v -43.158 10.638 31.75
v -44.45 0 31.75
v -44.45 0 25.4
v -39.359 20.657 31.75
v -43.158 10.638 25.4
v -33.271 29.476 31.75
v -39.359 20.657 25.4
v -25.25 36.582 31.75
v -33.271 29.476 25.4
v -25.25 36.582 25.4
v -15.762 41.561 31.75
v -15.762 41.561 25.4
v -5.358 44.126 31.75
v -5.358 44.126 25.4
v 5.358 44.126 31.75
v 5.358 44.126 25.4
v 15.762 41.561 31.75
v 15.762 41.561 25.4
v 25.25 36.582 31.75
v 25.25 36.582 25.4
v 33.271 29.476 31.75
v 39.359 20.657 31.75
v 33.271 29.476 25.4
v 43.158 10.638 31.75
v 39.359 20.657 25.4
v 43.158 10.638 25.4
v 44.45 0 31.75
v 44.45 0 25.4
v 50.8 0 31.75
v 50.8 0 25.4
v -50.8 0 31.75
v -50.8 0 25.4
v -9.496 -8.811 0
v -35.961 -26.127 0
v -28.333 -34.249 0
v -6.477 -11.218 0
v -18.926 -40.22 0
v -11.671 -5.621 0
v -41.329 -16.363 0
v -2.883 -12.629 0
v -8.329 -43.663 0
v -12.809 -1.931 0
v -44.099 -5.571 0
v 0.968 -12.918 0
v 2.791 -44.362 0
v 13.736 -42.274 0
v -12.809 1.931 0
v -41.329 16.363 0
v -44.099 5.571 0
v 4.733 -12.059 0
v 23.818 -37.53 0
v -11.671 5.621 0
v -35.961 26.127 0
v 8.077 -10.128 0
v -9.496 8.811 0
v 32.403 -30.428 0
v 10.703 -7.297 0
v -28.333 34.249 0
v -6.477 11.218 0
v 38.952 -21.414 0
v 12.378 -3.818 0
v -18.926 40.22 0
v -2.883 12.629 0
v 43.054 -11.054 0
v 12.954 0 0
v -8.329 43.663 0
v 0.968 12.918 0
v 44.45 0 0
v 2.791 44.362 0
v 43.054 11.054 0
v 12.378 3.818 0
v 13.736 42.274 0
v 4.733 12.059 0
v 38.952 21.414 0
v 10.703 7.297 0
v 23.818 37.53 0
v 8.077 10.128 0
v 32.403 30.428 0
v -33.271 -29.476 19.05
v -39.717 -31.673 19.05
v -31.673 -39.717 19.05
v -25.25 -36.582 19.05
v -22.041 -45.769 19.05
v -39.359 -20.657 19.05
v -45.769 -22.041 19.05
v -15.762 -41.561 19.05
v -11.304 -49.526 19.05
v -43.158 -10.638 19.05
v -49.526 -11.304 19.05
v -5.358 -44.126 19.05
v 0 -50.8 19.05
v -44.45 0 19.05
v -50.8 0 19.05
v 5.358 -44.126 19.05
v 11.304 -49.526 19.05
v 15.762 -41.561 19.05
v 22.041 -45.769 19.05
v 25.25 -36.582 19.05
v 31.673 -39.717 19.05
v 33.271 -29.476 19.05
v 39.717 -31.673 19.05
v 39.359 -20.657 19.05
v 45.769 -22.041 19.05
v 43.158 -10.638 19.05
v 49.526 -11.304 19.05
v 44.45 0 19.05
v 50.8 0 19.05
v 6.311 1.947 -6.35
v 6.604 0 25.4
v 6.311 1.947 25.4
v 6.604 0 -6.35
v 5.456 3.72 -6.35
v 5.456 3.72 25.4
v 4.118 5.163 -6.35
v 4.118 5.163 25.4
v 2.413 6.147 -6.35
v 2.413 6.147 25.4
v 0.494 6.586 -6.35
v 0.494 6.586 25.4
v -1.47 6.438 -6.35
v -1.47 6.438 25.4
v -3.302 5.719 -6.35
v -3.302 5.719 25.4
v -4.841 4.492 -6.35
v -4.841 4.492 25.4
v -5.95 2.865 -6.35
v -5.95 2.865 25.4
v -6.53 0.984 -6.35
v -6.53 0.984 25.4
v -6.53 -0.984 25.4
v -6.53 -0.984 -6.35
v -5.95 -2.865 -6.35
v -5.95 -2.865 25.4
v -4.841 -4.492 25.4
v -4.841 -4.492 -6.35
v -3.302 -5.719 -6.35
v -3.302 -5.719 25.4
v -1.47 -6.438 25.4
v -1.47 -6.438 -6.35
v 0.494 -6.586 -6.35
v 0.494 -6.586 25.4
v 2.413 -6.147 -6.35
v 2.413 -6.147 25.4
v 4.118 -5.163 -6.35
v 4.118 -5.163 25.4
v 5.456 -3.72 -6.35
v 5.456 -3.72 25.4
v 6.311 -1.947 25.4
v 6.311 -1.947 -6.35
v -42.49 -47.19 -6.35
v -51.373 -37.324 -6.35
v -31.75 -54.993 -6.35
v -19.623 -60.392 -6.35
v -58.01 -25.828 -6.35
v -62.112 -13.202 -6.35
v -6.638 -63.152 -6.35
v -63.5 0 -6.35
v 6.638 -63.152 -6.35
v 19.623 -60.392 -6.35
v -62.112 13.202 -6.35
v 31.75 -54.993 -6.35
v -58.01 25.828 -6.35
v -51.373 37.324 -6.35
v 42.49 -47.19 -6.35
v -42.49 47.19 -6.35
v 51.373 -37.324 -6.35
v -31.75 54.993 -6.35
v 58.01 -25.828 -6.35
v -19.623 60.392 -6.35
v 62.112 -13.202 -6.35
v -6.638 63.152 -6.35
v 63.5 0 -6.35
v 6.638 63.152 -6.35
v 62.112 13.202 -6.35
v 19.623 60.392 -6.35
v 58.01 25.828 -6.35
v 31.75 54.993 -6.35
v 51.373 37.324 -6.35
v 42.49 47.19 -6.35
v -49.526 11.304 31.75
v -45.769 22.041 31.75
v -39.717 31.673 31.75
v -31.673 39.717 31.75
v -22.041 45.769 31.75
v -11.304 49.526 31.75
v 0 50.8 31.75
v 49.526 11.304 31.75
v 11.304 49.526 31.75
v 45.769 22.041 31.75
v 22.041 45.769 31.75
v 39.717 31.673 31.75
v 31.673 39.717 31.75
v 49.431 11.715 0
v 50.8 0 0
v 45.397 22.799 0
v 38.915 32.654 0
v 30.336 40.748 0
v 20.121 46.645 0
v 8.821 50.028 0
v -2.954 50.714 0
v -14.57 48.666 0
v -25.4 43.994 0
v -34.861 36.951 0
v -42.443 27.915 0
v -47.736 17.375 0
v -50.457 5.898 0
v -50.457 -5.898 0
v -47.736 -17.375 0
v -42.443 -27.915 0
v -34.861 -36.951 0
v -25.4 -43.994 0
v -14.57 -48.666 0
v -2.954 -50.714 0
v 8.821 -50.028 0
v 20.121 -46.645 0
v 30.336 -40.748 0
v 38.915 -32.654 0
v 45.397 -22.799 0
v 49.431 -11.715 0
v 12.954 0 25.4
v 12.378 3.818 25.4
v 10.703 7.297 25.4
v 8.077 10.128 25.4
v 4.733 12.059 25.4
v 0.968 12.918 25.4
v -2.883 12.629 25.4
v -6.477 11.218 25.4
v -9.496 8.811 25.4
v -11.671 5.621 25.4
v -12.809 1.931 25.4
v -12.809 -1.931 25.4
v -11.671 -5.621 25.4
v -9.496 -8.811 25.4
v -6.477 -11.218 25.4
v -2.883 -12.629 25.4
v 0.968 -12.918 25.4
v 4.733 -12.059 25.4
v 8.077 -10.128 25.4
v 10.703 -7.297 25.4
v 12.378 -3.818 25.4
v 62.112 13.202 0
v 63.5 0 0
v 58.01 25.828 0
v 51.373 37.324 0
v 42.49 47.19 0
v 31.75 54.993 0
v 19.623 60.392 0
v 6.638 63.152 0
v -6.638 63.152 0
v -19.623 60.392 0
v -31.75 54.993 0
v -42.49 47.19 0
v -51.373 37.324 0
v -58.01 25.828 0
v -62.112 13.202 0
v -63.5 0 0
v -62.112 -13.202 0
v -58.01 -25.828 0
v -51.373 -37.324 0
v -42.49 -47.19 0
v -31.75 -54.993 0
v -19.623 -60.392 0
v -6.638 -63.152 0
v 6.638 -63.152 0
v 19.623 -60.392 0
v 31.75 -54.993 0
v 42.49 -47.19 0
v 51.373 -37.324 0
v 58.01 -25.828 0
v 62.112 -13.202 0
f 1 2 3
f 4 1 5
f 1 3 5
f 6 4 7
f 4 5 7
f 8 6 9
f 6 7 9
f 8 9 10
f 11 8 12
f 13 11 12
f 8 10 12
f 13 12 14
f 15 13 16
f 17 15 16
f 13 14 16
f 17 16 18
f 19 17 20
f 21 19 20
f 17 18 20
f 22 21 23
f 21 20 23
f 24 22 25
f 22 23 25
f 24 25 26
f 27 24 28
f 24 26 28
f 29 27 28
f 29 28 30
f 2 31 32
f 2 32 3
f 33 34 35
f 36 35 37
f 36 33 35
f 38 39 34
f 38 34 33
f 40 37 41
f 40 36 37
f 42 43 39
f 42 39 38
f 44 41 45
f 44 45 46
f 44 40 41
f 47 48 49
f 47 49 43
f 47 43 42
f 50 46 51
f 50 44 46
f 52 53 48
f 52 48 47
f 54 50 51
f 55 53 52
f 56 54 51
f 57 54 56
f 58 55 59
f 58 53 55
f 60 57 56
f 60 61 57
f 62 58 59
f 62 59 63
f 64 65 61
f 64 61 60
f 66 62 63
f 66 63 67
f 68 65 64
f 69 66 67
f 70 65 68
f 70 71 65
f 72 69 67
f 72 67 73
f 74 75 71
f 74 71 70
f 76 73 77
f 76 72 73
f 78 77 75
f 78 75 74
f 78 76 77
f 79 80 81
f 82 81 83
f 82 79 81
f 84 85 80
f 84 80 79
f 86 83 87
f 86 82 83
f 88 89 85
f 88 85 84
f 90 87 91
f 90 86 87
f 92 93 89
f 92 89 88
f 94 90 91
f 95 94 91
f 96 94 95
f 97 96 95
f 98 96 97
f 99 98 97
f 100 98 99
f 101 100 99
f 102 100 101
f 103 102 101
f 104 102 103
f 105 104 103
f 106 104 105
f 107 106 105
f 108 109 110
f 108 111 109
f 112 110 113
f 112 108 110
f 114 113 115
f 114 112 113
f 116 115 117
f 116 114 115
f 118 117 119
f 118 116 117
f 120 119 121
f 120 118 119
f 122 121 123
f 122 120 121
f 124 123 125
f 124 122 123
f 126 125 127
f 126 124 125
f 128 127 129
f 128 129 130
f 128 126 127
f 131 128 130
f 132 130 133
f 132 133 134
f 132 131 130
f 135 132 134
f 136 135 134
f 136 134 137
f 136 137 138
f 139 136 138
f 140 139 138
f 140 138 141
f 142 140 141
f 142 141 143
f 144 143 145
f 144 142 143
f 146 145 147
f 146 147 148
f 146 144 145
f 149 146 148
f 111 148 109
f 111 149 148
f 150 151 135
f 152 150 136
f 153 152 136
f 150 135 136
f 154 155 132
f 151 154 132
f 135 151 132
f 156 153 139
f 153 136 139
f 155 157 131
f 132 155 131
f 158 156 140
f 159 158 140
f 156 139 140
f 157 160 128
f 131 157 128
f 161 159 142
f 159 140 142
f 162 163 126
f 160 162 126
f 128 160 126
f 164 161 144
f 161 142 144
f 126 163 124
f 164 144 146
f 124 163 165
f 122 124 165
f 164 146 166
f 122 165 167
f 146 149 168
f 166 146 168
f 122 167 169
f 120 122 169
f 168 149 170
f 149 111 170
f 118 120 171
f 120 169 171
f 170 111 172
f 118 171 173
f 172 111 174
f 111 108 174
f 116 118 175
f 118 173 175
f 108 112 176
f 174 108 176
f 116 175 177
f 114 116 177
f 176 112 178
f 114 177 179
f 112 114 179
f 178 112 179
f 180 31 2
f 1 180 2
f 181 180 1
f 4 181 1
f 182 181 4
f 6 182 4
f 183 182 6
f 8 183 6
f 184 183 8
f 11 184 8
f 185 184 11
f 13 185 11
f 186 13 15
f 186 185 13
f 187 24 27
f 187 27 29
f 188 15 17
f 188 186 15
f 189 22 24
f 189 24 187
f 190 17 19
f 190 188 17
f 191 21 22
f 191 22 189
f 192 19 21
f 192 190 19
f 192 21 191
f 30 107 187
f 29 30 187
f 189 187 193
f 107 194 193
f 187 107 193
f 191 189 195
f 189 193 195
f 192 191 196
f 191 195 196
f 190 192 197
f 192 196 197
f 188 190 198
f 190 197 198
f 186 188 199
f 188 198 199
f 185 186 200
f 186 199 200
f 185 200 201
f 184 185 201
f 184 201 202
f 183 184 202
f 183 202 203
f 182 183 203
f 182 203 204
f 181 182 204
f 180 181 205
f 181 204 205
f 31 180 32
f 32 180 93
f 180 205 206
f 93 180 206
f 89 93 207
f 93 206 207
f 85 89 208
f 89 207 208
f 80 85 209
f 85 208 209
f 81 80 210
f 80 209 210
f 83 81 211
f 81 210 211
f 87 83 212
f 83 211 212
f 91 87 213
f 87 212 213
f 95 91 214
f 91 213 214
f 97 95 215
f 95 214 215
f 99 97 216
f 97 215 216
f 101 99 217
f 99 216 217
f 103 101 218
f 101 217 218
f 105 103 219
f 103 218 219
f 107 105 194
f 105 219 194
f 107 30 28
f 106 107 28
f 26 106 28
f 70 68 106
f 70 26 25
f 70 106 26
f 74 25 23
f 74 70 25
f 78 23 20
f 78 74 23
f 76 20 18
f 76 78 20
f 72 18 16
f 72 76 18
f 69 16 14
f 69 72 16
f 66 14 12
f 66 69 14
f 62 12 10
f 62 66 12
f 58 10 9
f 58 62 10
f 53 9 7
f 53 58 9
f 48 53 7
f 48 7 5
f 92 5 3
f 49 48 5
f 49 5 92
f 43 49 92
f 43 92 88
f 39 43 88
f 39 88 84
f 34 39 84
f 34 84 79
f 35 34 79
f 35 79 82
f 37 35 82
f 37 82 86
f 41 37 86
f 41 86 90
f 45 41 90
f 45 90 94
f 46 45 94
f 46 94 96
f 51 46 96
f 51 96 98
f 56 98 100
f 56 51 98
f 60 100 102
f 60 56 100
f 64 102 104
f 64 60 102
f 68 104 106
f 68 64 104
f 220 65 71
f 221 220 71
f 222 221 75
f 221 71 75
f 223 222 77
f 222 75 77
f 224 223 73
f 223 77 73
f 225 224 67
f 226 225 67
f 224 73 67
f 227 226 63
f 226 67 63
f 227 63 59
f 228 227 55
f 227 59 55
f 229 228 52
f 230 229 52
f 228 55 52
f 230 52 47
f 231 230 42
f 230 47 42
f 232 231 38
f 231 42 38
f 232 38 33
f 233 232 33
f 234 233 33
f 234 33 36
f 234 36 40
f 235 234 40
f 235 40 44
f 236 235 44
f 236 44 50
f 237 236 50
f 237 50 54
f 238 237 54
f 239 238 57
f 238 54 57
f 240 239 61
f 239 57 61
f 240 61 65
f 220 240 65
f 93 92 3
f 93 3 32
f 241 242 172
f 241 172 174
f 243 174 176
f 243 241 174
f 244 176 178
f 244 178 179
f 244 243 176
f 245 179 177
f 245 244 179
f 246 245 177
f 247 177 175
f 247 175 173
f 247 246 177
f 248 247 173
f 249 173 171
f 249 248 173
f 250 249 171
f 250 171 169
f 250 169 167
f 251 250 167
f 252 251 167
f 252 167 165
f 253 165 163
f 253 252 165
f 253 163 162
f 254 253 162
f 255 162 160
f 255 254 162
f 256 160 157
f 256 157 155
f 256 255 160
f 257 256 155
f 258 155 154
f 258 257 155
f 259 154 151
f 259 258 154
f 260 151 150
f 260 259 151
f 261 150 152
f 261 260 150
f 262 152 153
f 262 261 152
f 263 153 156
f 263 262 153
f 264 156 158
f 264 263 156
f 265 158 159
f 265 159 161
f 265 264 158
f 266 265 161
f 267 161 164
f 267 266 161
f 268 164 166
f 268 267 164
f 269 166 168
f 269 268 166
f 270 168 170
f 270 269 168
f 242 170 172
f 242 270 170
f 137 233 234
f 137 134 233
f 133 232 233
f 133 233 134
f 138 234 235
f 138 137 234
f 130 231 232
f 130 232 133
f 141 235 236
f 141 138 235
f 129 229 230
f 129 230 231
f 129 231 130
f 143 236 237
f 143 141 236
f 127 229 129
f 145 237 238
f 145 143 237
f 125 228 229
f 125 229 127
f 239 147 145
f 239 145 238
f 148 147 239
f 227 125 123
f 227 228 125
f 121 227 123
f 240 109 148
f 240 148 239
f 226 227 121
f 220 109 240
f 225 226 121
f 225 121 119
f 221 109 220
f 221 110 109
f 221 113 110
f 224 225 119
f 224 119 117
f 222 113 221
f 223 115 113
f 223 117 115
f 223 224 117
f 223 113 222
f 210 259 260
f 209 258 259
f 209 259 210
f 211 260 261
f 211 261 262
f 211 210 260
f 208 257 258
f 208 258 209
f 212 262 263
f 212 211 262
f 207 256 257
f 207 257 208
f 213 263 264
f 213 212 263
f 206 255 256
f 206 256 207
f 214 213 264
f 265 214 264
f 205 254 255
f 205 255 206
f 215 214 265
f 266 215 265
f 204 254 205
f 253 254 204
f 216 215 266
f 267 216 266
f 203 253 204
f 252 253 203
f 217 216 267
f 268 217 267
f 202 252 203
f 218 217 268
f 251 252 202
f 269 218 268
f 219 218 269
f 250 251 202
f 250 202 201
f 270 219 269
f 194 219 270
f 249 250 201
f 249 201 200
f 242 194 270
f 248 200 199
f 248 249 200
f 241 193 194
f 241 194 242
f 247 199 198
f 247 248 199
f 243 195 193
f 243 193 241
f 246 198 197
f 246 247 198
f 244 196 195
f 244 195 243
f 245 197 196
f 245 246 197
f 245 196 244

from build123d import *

# Parameters (mm, degrees)
F0_R     = 63.5
F0_R_2   = 50.8
F0_R_3   = 44.45
F0_R_4   = 12.954
F0_R_5   = 6.604
F1_DEPTH = 6.35
F2_DEPTH = 25.4
F4_DEPTH = 6.35
F5_DEPTH = 6.35


with BuildPart() as f1:
    # F0 (on Top) → F1 (new body)
    with BuildSketch(Plane.XY):
        Circle(F0_R)
        Circle(F0_R_2, mode=Mode.SUBTRACT)
        Circle(F0_R_2)
        Circle(F0_R_3, mode=Mode.SUBTRACT)
        Circle(F0_R_3)
        Circle(F0_R_4, mode=Mode.SUBTRACT)
        Circle(F0_R_4)
        Circle(F0_R_5, mode=Mode.SUBTRACT)
    extrude(amount=-F1_DEPTH)

    # F0 (on Top) → F2 (join)
    with BuildSketch(Plane.XY):
        Circle(F0_R_2)
        Circle(F0_R_3, mode=Mode.SUBTRACT)
        Circle(F0_R_4)
        Circle(F0_R_5, mode=Mode.SUBTRACT)
    extrude(amount=F2_DEPTH)

    # F3 (on face) → F4 (join)
    with BuildSketch(Plane.XY.offset(25.4)):
        with BuildLine():
            ThreePointArc((50.8, 0), (0, 50.8), (-50.8, 0))
            Line((-50.8, 0), (-44.45, 0))
            ThreePointArc((-44.45, 0), (0, 44.45), (44.45, 0))
            Line((44.45, 0), (50.8, 0))
        make_face()
    extrude(amount=F4_DEPTH)

    # F2_face (on face) → F5 (cut)
    with BuildSketch(Plane.XY.offset(25.4)):
        with BuildLine():
            ThreePointArc((-50.8, 0), (0, -50.8), (50.8, 0))
            Line((50.8, 0), (44.45, 0))
            ThreePointArc((44.45, 0), (0, -44.45), (-44.45, 0))
            Line((-44.45, 0), (-50.8, 0))
        make_face()
    extrude(amount=-F5_DEPTH, mode=Mode.SUBTRACT)


solid = f1.part
